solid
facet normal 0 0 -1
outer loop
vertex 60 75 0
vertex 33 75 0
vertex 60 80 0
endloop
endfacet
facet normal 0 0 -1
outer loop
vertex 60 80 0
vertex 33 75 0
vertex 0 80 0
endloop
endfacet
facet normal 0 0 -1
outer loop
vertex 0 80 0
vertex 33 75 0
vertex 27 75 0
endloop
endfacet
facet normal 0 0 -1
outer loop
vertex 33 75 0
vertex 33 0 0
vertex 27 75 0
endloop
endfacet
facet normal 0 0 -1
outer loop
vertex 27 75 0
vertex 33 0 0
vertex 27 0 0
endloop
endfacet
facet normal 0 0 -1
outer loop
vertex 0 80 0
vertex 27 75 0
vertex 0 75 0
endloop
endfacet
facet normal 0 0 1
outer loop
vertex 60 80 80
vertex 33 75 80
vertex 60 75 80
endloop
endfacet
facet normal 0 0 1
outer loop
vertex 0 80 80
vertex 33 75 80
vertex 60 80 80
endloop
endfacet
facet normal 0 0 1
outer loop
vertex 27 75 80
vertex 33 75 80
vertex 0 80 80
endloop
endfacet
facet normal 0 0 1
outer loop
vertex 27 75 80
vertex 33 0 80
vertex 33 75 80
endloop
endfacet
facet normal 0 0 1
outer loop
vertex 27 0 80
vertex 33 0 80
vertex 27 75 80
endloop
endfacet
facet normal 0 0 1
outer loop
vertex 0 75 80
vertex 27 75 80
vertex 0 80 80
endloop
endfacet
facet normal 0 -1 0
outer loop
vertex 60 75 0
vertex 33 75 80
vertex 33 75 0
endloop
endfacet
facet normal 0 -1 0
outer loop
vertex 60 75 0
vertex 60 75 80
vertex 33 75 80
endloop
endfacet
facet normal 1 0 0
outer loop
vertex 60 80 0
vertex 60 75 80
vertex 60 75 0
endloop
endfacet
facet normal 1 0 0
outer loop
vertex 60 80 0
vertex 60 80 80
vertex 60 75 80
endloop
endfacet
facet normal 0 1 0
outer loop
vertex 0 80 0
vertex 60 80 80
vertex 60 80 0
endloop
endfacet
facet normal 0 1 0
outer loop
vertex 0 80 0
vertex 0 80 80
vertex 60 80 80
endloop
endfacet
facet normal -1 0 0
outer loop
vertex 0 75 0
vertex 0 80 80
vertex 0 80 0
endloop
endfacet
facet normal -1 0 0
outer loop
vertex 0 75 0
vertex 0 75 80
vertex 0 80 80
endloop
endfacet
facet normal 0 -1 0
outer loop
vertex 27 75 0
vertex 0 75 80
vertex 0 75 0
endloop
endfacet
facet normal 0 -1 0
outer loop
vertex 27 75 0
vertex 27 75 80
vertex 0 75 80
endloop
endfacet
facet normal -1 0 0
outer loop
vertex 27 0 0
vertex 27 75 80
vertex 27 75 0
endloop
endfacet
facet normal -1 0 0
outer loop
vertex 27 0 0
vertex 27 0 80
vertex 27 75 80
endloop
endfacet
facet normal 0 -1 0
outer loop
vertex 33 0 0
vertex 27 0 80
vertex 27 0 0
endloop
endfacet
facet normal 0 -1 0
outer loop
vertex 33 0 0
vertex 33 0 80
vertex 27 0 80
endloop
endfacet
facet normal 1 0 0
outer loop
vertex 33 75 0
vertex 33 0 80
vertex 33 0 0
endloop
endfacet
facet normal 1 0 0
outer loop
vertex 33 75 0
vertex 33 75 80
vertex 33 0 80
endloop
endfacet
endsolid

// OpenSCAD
$fn = 32;

// ----------------------------------------------------------------------
// Structural section: tee 60 x 80 mm
// ----------------------------------------------------------------------

// --- parameters (mm) ---
sec_w = 60;               // tee width, X
sec_h = 80;               // tee height, Y
flange_t = 5;             // top flange thickness
web_t = 6;                // web thickness
plate_t = 80;             // cut length, Z (extrusion height)

profile = [[27, 0], [33, 0], [33, 75], [60, 75], [60, 80], [0, 80], [0, 75], [27, 75]];  // primary outline, 8 points, counter clockwise

// --- the one profile operation ---
linear_extrude(height = plate_t) polygon(points = profile);
